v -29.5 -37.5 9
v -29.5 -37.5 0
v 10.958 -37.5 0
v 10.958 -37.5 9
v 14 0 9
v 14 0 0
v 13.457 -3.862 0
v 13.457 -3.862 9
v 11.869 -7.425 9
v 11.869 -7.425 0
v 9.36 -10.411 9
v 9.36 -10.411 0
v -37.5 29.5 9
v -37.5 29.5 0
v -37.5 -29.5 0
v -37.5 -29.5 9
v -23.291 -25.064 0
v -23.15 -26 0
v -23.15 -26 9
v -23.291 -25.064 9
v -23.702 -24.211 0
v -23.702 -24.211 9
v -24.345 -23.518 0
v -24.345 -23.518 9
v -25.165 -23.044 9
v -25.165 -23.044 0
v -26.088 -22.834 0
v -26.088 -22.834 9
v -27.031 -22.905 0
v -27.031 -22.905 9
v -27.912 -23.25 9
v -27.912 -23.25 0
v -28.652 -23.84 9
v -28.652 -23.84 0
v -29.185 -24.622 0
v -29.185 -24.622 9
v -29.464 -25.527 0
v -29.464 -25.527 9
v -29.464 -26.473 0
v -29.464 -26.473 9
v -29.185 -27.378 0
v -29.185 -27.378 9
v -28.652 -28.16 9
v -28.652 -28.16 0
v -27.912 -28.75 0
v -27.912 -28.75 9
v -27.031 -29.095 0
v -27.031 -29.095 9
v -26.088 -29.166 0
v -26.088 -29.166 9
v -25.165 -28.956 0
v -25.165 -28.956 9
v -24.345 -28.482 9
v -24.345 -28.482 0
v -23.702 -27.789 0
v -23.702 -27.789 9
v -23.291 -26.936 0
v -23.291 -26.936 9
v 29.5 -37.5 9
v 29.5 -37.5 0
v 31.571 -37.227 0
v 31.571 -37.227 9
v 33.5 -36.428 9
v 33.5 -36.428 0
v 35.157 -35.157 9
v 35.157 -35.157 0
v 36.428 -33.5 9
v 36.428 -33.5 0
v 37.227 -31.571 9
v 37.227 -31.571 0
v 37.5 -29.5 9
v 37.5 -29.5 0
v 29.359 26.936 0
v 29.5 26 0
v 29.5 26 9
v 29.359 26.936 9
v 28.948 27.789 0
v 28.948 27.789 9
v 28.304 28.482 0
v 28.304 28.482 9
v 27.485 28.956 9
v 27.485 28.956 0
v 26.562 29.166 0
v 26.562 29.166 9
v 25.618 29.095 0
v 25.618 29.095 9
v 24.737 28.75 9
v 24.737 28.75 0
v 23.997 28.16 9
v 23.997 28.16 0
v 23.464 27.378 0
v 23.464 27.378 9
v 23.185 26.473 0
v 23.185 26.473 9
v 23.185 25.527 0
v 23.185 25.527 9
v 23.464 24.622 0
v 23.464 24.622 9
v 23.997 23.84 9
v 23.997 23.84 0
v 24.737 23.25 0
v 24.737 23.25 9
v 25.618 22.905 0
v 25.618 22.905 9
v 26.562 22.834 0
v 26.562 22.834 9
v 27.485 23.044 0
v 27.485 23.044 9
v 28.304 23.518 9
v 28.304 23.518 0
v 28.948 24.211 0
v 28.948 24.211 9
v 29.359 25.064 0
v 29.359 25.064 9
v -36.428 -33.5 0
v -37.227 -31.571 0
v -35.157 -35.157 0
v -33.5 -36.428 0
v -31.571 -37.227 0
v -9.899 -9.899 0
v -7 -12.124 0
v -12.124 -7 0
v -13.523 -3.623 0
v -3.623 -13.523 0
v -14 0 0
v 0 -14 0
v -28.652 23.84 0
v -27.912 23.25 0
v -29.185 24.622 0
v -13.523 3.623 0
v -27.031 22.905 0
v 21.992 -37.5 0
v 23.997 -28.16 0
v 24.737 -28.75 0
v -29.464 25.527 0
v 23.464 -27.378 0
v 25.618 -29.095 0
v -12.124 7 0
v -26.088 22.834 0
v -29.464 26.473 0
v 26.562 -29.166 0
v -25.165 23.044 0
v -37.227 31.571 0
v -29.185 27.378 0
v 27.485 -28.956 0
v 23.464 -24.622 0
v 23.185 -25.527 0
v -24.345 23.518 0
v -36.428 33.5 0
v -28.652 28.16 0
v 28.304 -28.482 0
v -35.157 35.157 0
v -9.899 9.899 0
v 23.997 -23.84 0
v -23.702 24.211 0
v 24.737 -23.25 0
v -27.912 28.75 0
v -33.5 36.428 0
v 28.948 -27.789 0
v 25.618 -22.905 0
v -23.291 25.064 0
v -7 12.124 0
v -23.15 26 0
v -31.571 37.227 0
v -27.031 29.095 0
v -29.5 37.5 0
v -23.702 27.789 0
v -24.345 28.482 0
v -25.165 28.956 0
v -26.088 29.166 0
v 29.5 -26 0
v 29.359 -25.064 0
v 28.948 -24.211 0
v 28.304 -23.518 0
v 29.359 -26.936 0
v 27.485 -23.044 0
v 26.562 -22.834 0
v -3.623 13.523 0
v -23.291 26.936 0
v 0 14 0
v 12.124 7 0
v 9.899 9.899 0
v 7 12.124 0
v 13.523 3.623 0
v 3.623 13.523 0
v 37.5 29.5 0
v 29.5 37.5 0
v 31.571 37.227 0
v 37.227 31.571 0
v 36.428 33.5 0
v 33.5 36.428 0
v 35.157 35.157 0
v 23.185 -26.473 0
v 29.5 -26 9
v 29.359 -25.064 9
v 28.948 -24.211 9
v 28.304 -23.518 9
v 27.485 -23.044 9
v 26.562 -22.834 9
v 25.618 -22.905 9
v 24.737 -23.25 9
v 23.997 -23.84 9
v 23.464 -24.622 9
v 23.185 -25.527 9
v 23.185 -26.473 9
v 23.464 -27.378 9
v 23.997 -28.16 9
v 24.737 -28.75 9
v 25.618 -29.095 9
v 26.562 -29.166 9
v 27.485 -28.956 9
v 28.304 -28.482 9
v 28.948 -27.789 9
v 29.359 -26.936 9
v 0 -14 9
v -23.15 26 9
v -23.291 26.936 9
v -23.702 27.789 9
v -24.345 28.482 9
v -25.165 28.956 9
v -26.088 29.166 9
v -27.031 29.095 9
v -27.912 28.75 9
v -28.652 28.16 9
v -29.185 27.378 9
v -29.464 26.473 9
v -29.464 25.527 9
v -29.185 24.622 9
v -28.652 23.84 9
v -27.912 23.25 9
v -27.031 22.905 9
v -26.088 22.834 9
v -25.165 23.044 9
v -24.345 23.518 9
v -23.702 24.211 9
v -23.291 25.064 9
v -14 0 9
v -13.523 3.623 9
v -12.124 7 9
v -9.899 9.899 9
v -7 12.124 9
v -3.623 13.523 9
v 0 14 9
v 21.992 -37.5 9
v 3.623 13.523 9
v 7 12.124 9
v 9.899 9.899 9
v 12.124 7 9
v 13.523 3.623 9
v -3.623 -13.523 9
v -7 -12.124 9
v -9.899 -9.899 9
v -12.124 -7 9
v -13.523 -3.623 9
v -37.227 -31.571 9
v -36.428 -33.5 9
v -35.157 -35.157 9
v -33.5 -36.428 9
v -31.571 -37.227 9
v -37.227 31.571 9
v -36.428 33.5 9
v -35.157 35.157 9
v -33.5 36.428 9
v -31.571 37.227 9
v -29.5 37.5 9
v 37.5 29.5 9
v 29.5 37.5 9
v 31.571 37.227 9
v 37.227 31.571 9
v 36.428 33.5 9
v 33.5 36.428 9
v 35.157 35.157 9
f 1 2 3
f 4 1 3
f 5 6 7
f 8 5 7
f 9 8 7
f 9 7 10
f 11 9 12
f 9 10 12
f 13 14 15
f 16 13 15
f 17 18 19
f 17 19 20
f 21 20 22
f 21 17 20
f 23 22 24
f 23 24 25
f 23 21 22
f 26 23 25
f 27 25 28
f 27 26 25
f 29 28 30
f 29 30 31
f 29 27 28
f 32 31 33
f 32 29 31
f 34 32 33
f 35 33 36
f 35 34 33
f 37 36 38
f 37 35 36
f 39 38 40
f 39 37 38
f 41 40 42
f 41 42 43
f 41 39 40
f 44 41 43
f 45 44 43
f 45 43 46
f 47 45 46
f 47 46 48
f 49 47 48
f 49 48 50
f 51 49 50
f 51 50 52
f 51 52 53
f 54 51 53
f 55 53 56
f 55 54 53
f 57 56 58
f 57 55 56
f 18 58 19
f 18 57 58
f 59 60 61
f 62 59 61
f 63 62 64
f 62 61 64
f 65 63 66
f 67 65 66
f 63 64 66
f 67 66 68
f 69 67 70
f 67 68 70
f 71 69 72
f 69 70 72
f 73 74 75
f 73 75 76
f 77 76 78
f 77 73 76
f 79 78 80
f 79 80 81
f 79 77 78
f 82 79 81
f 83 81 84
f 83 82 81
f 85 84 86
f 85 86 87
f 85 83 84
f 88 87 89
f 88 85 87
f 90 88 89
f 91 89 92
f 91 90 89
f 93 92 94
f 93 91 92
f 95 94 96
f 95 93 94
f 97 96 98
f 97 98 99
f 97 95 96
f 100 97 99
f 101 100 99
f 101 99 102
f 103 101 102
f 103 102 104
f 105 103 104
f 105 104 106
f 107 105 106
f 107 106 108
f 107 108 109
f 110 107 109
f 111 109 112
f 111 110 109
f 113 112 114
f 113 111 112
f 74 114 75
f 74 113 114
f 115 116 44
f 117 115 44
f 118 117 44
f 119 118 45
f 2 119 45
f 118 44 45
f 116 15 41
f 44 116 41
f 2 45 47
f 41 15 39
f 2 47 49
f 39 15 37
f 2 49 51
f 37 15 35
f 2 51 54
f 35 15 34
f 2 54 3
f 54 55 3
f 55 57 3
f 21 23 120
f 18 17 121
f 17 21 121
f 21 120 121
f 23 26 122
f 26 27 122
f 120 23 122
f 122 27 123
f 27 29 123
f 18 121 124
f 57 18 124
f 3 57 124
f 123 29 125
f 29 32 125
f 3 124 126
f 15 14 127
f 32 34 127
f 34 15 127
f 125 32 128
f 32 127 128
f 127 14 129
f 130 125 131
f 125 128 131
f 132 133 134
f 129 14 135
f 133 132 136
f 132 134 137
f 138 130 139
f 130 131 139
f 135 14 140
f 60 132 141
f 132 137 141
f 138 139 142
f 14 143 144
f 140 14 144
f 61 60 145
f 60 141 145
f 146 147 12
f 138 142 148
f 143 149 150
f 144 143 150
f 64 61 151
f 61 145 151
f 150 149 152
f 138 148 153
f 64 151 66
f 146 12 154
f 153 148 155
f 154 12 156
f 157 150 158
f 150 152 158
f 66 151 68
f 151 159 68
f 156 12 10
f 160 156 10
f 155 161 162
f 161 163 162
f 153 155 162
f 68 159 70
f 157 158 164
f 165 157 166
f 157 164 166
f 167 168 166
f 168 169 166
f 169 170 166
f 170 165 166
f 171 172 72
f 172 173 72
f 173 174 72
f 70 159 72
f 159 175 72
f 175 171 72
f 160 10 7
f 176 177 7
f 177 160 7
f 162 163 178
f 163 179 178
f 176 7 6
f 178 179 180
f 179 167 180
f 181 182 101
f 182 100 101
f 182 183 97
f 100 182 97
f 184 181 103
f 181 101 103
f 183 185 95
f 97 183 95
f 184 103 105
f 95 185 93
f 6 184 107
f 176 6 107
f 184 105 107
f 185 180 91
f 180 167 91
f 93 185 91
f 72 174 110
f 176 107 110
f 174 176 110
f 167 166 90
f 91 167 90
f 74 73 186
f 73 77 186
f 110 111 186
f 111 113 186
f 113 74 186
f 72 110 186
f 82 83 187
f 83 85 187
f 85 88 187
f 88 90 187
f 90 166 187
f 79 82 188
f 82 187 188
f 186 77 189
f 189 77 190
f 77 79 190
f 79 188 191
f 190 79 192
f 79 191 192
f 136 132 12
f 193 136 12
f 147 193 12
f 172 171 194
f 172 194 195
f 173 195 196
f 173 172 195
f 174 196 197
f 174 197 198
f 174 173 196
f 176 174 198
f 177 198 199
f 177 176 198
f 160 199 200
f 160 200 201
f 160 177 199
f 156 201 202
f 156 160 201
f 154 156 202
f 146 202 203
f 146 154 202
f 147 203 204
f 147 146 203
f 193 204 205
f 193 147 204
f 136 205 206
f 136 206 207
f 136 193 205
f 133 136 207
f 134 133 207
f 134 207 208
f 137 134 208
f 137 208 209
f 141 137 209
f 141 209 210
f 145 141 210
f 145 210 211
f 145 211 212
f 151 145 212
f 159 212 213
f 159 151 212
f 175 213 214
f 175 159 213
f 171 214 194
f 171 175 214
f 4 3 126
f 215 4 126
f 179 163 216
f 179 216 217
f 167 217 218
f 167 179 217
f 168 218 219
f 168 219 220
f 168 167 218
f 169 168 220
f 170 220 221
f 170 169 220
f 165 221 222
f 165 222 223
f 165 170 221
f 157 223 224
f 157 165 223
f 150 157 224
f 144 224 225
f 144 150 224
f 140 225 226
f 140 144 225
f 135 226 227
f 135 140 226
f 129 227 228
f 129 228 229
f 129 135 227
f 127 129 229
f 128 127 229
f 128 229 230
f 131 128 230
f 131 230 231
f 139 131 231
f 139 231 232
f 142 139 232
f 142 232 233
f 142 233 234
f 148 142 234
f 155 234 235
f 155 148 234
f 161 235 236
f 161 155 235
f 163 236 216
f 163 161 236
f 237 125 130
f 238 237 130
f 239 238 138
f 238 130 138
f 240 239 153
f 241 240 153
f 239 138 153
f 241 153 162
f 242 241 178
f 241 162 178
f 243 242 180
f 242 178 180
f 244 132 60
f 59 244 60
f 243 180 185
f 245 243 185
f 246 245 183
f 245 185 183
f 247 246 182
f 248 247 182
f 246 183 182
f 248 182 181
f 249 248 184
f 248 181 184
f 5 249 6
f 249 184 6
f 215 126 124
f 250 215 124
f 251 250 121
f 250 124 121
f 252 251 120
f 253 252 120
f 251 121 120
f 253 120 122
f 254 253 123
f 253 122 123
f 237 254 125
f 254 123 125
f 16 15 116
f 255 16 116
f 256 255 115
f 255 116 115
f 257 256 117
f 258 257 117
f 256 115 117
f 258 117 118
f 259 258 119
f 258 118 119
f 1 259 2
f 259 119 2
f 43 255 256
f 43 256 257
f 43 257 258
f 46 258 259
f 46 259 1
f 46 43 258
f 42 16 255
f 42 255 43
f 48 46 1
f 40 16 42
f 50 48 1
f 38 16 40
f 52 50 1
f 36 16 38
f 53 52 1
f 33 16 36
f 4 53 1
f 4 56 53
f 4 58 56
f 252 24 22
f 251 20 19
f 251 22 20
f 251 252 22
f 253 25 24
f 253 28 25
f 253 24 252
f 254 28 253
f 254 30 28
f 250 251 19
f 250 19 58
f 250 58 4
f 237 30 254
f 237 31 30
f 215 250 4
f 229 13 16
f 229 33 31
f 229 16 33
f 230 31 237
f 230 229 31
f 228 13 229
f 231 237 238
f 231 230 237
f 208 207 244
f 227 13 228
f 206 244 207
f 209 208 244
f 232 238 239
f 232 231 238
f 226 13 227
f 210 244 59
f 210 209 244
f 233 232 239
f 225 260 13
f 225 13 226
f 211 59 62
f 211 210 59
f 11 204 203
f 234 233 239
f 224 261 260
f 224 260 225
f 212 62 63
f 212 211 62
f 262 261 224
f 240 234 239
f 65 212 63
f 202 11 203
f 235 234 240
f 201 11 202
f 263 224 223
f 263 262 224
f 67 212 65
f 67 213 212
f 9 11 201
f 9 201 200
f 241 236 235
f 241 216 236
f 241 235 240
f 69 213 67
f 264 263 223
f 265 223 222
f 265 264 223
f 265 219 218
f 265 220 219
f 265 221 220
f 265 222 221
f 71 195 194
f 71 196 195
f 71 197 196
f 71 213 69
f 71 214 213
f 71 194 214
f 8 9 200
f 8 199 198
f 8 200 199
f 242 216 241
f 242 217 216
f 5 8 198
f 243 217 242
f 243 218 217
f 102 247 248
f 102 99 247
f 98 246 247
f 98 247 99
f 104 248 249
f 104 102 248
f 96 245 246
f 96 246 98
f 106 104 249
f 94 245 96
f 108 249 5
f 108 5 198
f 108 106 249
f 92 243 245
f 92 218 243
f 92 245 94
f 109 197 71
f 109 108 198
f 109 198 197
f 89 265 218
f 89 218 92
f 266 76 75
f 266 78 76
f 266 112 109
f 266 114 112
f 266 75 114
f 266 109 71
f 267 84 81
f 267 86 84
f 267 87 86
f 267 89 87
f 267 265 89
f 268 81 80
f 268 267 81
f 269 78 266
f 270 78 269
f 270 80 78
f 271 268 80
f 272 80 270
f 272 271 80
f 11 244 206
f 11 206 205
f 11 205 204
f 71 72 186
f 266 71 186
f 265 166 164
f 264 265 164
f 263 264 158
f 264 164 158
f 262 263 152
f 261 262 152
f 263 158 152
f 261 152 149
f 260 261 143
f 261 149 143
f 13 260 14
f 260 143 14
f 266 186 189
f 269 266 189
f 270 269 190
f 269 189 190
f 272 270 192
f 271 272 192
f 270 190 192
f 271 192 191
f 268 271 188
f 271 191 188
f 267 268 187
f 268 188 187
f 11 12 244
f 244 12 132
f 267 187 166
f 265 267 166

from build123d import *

# Parameters (mm, degrees)
F0_R     = 3.175
F1_DEPTH = 9


# Not quite as in the source:
# - ends of sketch curves that miss each other by under 0.0002 mm in the source are joined


with BuildPart() as f1:
    # F0 (on Top) → F1 (new body)
    with BuildSketch(Plane.XY):
        Polygon((10.95823, -37.5), (0, -14), (0, -37.5), align=None)
        with BuildLine():
            ThreePointArc((0, -14), (-9.8994949366, -9.8994949366), (-14, 0))
            Line((-14, 0), (-37.5, 0))
            Line((-37.5, 0), (-37.5, -29.5))
            ThreePointArc((-37.5, -29.5), (-35.1568542495, -35.1568542495), (-29.5, -37.5))
            Line((-29.5, -37.5), (0, -37.5))
            Line((0, -37.5), (0, -14))
        make_face()
        with Locations((-26.324893, -26)):
            Circle(F0_R, mode=Mode.SUBTRACT)
        with BuildLine():
            Line((37.5, 0), (14, 0))
            ThreePointArc((14, 0), (12.787539009, -5.6990215031), (9.3601648439, -10.4109228263))
            Line((9.3601648439, -10.4109228263), (21.992009, -37.5))
            Line((21.992009, -37.5), (29.5, -37.5))
            ThreePointArc((29.5, -37.5), (35.1568542495, -35.1568542495), (37.5, -29.5))
            Line((37.5, -29.5), (37.5, 0))
        make_face()
        with Locations((26.324893, -26)):
            Circle(F0_R, mode=Mode.SUBTRACT)
        with BuildLine():
            Line((29.5, 37.5), (0, 37.5))
            Line((0, 37.5), (0, 14))
            ThreePointArc((0, 14), (9.8994949366, 9.8994949366), (14, 0))
            Line((14, 0), (37.5, 0))
            Line((37.5, 0), (37.5, 29.5))
            ThreePointArc((37.5, 29.5), (35.1568542495, 35.1568542495), (29.5, 37.5))
        make_face()
        with Locations((26.324893, 26)):
            Circle(F0_R, mode=Mode.SUBTRACT)
        with BuildLine():
            Line((0, 14), (0, 37.5))
            Line((0, 37.5), (-29.5, 37.5))
            ThreePointArc((-29.5, 37.5), (-35.1568542495, 35.1568542495), (-37.5, 29.5))
            Line((-37.5, 29.5), (-37.5, 0))
            Line((-37.5, 0), (-14, 0))
            ThreePointArc((-14, 0), (-9.8994949366, 9.8994949366), (0, 14))
        make_face()
        with Locations((-26.324893, 26)):
            Circle(F0_R, mode=Mode.SUBTRACT)
    extrude(amount=F1_DEPTH)


solid = f1.part
